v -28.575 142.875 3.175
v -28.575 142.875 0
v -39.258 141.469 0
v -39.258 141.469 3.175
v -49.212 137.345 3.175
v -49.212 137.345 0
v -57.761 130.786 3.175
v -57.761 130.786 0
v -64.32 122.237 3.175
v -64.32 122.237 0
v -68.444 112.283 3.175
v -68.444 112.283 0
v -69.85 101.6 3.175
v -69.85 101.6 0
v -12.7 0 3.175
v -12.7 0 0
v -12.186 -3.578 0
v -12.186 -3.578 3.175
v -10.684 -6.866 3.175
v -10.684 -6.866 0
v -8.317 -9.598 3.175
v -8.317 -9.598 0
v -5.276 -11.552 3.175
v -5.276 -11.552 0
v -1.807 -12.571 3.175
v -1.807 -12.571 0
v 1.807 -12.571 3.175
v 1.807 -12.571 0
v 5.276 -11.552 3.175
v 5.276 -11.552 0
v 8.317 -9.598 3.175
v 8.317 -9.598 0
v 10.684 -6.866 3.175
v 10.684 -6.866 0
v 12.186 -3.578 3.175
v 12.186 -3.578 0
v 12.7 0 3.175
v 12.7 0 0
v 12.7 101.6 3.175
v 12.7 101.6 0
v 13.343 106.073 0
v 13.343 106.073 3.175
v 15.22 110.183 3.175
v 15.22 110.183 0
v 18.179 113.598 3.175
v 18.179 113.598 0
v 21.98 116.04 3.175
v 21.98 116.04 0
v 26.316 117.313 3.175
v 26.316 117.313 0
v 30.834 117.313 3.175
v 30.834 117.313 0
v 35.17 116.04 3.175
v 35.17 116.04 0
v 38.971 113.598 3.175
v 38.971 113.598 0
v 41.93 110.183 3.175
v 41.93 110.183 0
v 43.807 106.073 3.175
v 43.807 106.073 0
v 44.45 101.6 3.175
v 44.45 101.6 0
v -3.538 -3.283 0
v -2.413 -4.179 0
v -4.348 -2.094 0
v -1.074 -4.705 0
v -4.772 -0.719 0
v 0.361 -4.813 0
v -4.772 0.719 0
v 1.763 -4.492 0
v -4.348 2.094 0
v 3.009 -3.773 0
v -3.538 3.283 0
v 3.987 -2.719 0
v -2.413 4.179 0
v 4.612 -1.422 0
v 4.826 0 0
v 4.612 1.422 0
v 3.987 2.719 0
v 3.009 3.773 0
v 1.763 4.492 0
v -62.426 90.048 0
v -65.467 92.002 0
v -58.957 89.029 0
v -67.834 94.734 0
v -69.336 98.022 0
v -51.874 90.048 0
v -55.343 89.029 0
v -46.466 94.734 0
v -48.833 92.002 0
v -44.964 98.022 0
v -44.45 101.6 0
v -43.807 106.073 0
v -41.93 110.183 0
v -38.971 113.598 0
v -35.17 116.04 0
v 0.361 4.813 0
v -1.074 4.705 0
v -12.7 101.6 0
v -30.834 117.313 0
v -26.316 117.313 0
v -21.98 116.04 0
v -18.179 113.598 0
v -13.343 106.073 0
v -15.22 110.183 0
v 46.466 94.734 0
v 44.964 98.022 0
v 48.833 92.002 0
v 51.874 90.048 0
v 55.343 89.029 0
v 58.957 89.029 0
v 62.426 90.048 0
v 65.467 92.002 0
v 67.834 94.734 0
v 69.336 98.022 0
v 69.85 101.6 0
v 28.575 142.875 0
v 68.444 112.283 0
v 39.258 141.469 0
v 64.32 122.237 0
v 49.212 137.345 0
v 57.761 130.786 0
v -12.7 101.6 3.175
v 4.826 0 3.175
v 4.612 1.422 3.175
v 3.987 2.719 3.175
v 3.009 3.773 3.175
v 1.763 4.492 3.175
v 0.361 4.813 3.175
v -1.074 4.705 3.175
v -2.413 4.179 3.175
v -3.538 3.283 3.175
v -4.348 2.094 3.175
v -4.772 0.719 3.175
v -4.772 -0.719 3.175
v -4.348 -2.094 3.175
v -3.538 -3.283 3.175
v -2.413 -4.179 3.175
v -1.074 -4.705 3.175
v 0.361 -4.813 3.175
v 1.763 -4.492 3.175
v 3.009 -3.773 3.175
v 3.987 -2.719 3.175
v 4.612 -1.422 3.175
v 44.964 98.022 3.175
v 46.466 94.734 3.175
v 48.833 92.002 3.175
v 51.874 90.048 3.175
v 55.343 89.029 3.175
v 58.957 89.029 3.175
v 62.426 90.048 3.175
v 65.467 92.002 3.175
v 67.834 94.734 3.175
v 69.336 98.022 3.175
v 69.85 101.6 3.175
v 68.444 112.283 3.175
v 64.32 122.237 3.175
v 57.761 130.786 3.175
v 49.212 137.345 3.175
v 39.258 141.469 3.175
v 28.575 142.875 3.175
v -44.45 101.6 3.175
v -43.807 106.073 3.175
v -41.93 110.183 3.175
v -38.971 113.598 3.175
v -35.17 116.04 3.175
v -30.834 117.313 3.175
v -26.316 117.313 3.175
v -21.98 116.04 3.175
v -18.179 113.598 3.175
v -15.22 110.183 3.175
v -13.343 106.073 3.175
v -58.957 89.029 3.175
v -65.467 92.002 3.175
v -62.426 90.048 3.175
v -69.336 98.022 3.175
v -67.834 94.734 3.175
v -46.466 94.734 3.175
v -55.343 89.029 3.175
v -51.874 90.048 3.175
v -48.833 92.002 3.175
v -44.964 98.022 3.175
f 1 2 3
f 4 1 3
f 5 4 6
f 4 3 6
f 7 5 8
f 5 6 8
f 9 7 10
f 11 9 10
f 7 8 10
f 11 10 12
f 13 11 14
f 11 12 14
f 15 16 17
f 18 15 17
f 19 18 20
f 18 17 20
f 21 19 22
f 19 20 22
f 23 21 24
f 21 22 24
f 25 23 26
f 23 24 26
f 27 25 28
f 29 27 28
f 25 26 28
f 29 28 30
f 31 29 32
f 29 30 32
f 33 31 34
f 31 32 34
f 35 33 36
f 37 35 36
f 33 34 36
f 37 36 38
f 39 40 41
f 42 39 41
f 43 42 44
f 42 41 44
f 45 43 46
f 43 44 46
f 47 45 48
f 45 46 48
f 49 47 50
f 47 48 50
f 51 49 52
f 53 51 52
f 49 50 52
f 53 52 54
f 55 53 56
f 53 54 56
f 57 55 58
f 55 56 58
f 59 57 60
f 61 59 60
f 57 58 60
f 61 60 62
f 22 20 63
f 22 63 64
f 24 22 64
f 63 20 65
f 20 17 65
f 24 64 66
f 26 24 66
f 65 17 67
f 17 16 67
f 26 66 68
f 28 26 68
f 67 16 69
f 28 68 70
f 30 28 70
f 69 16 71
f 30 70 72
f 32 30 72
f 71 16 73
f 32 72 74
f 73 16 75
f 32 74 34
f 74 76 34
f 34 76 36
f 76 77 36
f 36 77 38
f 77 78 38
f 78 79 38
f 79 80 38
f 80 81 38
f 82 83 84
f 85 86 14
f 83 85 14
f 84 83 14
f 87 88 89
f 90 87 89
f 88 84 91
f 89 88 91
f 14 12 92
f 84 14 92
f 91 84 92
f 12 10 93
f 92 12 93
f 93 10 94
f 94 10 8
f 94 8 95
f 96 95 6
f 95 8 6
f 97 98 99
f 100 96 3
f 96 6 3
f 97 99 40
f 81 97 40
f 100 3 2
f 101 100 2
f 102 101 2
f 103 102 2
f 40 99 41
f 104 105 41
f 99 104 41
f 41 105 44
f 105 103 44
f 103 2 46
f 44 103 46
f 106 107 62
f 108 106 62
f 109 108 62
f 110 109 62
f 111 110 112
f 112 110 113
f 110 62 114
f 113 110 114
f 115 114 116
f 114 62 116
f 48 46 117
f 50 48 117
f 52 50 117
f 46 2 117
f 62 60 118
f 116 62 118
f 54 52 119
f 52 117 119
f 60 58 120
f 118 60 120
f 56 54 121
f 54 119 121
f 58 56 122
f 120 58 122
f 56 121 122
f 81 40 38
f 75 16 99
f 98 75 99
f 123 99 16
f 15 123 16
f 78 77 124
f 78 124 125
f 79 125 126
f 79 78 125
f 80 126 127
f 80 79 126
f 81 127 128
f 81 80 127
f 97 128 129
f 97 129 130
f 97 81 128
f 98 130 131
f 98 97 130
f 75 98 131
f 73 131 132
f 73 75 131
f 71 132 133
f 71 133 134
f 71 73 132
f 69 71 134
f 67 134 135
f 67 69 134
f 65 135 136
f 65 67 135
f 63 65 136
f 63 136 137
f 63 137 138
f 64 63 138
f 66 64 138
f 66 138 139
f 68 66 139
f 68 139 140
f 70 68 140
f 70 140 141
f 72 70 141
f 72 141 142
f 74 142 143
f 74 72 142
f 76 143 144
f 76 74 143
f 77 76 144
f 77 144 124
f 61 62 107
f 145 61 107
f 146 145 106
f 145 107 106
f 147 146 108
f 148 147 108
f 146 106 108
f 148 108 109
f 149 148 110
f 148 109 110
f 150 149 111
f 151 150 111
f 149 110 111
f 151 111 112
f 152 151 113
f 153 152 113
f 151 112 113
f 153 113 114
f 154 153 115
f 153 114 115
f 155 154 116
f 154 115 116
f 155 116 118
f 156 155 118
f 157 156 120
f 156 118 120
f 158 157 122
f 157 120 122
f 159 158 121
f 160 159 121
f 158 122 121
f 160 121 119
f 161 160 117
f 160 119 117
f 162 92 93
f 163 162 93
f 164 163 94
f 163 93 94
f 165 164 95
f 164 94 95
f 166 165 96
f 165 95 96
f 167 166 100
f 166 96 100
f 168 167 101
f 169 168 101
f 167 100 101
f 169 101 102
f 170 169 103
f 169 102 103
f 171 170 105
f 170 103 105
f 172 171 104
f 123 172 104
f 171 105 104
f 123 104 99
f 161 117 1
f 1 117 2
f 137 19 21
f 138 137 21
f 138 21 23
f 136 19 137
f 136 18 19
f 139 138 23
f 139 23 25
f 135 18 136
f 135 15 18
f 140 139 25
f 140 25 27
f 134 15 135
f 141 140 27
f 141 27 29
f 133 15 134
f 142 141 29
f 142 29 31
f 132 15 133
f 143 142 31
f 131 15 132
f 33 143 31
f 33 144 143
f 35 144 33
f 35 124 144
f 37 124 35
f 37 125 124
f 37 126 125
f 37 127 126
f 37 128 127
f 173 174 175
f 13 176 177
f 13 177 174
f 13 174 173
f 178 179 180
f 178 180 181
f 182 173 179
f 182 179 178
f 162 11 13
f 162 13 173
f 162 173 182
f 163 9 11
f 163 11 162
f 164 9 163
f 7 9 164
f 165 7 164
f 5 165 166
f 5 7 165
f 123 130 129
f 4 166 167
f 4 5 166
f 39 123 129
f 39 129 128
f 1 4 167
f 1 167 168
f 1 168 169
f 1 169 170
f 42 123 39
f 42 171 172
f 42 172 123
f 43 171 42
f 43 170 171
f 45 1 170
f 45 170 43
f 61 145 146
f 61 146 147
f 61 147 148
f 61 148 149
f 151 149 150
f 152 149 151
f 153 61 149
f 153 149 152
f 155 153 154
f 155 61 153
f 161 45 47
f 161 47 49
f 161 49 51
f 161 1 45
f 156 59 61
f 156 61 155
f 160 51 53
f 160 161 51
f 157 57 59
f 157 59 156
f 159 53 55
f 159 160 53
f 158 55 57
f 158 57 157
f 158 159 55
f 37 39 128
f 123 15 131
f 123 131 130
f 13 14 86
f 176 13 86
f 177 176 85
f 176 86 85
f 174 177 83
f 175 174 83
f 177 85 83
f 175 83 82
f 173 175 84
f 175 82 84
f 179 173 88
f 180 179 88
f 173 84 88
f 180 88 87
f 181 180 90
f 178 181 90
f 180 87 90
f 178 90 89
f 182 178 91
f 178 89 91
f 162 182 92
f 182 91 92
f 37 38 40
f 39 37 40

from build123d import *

# Parameters (mm, degrees)
SKETCH1_R           = 4.826
BOSS_EXTRUDE2_DEPTH = 3.175


with BuildPart() as part:
    # Sketch1 → Boss-Extrude2 (new body)
    with BuildSketch(Plane.XY):
        with BuildLine():
            Line((12.7, 0), (12.7, 101.6))
            ThreePointArc((12.7, 101.6), (28.575, 117.475), (44.45, 101.6))
            ThreePointArc((44.45, 101.6), (57.15, 88.9), (69.85, 101.6))
            ThreePointArc((69.85, 101.6), (57.760832393, 130.785832393), (28.575, 142.875))
            Line((28.575, 142.875), (-28.575, 142.875))
            ThreePointArc((-28.575, 142.875), (-57.760832393, 130.785832393), (-69.85, 101.6))
            ThreePointArc((-69.85, 101.6), (-57.15, 88.9), (-44.45, 101.6))
            ThreePointArc((-44.45, 101.6), (-28.575, 117.475), (-12.7, 101.6))
            Line((-12.7, 101.6), (-12.7, 0))
            ThreePointArc((-12.7, 0), (0, -12.7), (12.7, 0))
        make_face()
        Circle(SKETCH1_R, mode=Mode.SUBTRACT)
    extrude(amount=BOSS_EXTRUDE2_DEPTH)


solid = part.part
